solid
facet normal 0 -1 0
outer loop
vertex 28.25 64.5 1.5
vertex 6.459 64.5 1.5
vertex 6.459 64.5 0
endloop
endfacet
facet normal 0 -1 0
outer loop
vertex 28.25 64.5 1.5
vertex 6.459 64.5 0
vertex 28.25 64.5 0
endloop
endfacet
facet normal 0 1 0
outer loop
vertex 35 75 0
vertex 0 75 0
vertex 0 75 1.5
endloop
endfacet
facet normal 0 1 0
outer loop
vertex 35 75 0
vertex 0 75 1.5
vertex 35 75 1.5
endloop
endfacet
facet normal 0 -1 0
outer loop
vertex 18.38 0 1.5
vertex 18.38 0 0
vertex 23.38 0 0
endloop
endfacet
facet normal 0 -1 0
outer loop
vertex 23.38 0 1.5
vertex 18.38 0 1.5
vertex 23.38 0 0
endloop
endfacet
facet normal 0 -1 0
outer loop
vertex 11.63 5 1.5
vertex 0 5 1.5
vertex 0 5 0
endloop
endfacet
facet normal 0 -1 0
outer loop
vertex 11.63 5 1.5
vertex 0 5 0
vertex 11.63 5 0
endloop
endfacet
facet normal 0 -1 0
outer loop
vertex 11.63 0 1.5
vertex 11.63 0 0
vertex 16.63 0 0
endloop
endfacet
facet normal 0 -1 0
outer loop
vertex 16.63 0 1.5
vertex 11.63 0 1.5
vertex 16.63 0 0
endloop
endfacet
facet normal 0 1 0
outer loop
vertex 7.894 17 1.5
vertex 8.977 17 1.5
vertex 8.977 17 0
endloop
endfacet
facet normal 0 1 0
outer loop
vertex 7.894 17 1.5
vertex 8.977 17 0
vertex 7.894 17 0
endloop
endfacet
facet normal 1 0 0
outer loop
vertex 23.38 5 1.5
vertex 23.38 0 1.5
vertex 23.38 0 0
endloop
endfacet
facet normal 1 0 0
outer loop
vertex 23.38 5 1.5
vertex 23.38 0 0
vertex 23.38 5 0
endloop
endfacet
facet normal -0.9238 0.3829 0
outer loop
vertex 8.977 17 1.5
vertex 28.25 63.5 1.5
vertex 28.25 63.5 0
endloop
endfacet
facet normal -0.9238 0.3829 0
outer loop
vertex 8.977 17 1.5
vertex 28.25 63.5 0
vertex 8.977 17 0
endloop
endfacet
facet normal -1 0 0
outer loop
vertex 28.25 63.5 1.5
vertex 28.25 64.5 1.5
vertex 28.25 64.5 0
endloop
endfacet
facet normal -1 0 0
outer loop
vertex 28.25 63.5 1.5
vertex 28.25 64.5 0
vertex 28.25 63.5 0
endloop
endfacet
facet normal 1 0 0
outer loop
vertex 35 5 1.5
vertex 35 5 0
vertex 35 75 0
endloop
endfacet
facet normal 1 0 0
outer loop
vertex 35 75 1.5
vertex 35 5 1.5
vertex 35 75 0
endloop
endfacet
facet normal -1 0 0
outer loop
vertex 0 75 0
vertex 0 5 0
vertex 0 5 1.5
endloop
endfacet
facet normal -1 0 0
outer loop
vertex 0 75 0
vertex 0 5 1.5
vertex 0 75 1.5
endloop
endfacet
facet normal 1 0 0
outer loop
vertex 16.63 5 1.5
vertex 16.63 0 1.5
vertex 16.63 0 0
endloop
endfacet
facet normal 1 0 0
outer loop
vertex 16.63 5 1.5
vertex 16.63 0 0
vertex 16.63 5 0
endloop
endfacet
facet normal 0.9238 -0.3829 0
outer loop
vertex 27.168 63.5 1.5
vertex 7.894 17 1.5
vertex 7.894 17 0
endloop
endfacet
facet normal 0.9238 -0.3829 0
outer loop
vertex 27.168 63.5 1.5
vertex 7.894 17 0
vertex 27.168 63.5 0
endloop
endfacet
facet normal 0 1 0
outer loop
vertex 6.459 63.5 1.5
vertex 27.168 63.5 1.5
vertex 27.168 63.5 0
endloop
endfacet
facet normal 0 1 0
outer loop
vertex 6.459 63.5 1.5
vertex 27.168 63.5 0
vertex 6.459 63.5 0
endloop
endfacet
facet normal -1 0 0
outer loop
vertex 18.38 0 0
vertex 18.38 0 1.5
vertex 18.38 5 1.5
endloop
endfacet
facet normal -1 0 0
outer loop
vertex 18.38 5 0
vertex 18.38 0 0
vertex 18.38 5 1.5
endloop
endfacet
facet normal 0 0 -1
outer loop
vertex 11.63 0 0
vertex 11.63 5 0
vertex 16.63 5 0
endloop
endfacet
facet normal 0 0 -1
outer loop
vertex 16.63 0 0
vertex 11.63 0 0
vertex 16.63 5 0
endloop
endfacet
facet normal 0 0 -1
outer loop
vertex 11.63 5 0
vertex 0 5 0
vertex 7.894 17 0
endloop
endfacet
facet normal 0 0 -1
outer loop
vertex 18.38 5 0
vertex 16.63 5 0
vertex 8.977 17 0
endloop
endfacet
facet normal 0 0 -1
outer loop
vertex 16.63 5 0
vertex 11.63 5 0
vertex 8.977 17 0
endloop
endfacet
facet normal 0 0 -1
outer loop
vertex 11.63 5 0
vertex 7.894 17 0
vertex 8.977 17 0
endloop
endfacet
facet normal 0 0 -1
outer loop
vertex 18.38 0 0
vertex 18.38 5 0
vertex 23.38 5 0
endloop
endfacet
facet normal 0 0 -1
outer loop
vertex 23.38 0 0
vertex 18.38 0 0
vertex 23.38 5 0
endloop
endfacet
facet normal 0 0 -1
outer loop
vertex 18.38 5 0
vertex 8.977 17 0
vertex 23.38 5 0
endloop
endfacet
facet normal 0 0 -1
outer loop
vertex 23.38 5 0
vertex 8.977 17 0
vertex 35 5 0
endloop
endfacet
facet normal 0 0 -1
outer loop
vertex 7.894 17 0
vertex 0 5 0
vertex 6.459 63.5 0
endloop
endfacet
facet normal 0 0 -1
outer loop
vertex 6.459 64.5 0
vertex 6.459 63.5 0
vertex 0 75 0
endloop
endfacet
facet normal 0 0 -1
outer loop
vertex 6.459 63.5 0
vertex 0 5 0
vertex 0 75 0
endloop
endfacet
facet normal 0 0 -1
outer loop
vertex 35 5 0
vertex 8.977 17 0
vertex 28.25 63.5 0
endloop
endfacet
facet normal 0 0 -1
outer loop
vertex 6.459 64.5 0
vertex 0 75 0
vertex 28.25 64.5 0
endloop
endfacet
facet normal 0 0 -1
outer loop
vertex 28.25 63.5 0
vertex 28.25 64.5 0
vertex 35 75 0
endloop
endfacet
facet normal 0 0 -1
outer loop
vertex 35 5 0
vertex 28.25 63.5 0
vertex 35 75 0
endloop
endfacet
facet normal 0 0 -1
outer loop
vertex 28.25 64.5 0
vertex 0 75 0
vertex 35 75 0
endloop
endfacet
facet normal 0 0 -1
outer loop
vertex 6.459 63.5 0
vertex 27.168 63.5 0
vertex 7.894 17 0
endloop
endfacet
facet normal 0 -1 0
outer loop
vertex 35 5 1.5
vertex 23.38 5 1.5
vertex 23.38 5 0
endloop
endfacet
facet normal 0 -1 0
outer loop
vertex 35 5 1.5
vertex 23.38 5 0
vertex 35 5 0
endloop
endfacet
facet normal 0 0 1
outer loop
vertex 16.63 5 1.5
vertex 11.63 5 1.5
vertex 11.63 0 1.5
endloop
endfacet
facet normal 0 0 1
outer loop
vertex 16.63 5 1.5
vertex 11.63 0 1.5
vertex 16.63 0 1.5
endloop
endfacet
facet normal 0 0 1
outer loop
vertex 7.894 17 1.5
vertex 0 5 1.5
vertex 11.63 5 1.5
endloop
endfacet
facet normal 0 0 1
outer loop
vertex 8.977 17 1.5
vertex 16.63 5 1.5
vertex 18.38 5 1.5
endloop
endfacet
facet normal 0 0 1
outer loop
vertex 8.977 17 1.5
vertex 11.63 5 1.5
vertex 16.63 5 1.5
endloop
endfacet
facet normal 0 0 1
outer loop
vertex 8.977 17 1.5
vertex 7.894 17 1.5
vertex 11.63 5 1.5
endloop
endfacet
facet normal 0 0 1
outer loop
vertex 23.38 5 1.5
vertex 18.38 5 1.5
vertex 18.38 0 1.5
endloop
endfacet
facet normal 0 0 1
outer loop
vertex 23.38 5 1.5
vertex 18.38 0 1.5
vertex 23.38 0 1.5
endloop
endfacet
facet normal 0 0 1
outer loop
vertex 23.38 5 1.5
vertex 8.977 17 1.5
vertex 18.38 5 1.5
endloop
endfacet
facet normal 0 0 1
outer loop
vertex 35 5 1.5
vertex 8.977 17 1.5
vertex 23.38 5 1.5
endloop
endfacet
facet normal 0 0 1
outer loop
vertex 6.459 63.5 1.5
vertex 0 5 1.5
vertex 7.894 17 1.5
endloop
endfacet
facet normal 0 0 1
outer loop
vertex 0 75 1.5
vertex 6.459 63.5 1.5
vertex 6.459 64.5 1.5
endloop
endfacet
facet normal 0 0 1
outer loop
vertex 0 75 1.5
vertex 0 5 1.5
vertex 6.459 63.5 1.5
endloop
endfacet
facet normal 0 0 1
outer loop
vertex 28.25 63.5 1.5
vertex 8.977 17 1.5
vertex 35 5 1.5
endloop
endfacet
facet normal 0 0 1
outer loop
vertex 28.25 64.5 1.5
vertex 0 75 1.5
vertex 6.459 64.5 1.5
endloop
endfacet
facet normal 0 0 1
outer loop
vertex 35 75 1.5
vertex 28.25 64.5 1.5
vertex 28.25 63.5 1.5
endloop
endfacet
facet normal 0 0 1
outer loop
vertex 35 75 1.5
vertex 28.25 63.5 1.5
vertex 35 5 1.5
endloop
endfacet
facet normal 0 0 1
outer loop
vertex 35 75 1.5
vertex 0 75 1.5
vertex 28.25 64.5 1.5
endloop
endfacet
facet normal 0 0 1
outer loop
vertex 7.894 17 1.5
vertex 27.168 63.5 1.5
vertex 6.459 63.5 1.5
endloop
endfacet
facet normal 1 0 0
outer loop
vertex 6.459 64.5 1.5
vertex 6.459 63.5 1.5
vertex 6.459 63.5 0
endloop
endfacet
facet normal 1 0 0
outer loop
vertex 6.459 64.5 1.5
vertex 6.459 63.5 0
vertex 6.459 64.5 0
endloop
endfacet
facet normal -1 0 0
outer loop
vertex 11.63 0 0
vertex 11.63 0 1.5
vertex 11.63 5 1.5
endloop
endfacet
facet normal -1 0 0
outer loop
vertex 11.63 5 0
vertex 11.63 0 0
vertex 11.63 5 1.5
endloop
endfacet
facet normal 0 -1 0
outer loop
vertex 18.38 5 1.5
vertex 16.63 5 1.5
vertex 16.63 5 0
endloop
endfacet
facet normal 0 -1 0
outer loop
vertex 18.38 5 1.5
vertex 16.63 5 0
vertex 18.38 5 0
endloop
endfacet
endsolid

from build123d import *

# Parameters (mm, degrees)
SKIZZE1_W                       = 35
SKIZZE1_H                       = 75
AUFSATZ_LINEAR_AUSTRAGEN1_DEPTH = 1.5
SKIZZE2_W                       = 11.63
SKIZZE2_H                       = 5
SKIZZE2_W_2                     = 11.62
SKIZZE2_W_3                     = 1.75
SCHNITT_LINEAR_AUSTRAGEN1_DEPTH = 1.5
SCHNITT_LINEAR_AUSTRAGEN7_DEPTH = 20


with BuildPart() as part:
    # Skizze1 → Aufsatz-Linear austragen1 (new body)
    with BuildSketch(Plane.XY):
        with Locations((17.5, 37.5)):
            Rectangle(SKIZZE1_W, SKIZZE1_H)
    extrude(amount=AUFSATZ_LINEAR_AUSTRAGEN1_DEPTH)

    # Skizze2 → Schnitt-Linear austragen1 (cut)
    with BuildSketch(Plane.XY.offset(1.5)):
        with Locations((5.815, 2.5)):
            Rectangle(SKIZZE2_W, SKIZZE2_H)
        with Locations((29.19, 2.5)):
            Rectangle(SKIZZE2_W_2, SKIZZE2_H)
        with Locations((17.505, 2.5)):
            Rectangle(SKIZZE2_W_3, SKIZZE2_H)
    extrude(amount=-SCHNITT_LINEAR_AUSTRAGEN1_DEPTH, mode=Mode.SUBTRACT)

    # Skizze12 → Schnitt-Linear austragen7 (cut)
    with BuildSketch(Plane.XY.offset(1.5)):
        Polygon((6.459240655, 64.5), (28.25, 64.5), (28.25, 63.5), (8.976723544, 17), (7.894229713, 17), (27.167506169, 63.5), (6.459240655, 63.5), align=None)
    extrude(amount=-SCHNITT_LINEAR_AUSTRAGEN7_DEPTH, mode=Mode.SUBTRACT)


solid = part.part
